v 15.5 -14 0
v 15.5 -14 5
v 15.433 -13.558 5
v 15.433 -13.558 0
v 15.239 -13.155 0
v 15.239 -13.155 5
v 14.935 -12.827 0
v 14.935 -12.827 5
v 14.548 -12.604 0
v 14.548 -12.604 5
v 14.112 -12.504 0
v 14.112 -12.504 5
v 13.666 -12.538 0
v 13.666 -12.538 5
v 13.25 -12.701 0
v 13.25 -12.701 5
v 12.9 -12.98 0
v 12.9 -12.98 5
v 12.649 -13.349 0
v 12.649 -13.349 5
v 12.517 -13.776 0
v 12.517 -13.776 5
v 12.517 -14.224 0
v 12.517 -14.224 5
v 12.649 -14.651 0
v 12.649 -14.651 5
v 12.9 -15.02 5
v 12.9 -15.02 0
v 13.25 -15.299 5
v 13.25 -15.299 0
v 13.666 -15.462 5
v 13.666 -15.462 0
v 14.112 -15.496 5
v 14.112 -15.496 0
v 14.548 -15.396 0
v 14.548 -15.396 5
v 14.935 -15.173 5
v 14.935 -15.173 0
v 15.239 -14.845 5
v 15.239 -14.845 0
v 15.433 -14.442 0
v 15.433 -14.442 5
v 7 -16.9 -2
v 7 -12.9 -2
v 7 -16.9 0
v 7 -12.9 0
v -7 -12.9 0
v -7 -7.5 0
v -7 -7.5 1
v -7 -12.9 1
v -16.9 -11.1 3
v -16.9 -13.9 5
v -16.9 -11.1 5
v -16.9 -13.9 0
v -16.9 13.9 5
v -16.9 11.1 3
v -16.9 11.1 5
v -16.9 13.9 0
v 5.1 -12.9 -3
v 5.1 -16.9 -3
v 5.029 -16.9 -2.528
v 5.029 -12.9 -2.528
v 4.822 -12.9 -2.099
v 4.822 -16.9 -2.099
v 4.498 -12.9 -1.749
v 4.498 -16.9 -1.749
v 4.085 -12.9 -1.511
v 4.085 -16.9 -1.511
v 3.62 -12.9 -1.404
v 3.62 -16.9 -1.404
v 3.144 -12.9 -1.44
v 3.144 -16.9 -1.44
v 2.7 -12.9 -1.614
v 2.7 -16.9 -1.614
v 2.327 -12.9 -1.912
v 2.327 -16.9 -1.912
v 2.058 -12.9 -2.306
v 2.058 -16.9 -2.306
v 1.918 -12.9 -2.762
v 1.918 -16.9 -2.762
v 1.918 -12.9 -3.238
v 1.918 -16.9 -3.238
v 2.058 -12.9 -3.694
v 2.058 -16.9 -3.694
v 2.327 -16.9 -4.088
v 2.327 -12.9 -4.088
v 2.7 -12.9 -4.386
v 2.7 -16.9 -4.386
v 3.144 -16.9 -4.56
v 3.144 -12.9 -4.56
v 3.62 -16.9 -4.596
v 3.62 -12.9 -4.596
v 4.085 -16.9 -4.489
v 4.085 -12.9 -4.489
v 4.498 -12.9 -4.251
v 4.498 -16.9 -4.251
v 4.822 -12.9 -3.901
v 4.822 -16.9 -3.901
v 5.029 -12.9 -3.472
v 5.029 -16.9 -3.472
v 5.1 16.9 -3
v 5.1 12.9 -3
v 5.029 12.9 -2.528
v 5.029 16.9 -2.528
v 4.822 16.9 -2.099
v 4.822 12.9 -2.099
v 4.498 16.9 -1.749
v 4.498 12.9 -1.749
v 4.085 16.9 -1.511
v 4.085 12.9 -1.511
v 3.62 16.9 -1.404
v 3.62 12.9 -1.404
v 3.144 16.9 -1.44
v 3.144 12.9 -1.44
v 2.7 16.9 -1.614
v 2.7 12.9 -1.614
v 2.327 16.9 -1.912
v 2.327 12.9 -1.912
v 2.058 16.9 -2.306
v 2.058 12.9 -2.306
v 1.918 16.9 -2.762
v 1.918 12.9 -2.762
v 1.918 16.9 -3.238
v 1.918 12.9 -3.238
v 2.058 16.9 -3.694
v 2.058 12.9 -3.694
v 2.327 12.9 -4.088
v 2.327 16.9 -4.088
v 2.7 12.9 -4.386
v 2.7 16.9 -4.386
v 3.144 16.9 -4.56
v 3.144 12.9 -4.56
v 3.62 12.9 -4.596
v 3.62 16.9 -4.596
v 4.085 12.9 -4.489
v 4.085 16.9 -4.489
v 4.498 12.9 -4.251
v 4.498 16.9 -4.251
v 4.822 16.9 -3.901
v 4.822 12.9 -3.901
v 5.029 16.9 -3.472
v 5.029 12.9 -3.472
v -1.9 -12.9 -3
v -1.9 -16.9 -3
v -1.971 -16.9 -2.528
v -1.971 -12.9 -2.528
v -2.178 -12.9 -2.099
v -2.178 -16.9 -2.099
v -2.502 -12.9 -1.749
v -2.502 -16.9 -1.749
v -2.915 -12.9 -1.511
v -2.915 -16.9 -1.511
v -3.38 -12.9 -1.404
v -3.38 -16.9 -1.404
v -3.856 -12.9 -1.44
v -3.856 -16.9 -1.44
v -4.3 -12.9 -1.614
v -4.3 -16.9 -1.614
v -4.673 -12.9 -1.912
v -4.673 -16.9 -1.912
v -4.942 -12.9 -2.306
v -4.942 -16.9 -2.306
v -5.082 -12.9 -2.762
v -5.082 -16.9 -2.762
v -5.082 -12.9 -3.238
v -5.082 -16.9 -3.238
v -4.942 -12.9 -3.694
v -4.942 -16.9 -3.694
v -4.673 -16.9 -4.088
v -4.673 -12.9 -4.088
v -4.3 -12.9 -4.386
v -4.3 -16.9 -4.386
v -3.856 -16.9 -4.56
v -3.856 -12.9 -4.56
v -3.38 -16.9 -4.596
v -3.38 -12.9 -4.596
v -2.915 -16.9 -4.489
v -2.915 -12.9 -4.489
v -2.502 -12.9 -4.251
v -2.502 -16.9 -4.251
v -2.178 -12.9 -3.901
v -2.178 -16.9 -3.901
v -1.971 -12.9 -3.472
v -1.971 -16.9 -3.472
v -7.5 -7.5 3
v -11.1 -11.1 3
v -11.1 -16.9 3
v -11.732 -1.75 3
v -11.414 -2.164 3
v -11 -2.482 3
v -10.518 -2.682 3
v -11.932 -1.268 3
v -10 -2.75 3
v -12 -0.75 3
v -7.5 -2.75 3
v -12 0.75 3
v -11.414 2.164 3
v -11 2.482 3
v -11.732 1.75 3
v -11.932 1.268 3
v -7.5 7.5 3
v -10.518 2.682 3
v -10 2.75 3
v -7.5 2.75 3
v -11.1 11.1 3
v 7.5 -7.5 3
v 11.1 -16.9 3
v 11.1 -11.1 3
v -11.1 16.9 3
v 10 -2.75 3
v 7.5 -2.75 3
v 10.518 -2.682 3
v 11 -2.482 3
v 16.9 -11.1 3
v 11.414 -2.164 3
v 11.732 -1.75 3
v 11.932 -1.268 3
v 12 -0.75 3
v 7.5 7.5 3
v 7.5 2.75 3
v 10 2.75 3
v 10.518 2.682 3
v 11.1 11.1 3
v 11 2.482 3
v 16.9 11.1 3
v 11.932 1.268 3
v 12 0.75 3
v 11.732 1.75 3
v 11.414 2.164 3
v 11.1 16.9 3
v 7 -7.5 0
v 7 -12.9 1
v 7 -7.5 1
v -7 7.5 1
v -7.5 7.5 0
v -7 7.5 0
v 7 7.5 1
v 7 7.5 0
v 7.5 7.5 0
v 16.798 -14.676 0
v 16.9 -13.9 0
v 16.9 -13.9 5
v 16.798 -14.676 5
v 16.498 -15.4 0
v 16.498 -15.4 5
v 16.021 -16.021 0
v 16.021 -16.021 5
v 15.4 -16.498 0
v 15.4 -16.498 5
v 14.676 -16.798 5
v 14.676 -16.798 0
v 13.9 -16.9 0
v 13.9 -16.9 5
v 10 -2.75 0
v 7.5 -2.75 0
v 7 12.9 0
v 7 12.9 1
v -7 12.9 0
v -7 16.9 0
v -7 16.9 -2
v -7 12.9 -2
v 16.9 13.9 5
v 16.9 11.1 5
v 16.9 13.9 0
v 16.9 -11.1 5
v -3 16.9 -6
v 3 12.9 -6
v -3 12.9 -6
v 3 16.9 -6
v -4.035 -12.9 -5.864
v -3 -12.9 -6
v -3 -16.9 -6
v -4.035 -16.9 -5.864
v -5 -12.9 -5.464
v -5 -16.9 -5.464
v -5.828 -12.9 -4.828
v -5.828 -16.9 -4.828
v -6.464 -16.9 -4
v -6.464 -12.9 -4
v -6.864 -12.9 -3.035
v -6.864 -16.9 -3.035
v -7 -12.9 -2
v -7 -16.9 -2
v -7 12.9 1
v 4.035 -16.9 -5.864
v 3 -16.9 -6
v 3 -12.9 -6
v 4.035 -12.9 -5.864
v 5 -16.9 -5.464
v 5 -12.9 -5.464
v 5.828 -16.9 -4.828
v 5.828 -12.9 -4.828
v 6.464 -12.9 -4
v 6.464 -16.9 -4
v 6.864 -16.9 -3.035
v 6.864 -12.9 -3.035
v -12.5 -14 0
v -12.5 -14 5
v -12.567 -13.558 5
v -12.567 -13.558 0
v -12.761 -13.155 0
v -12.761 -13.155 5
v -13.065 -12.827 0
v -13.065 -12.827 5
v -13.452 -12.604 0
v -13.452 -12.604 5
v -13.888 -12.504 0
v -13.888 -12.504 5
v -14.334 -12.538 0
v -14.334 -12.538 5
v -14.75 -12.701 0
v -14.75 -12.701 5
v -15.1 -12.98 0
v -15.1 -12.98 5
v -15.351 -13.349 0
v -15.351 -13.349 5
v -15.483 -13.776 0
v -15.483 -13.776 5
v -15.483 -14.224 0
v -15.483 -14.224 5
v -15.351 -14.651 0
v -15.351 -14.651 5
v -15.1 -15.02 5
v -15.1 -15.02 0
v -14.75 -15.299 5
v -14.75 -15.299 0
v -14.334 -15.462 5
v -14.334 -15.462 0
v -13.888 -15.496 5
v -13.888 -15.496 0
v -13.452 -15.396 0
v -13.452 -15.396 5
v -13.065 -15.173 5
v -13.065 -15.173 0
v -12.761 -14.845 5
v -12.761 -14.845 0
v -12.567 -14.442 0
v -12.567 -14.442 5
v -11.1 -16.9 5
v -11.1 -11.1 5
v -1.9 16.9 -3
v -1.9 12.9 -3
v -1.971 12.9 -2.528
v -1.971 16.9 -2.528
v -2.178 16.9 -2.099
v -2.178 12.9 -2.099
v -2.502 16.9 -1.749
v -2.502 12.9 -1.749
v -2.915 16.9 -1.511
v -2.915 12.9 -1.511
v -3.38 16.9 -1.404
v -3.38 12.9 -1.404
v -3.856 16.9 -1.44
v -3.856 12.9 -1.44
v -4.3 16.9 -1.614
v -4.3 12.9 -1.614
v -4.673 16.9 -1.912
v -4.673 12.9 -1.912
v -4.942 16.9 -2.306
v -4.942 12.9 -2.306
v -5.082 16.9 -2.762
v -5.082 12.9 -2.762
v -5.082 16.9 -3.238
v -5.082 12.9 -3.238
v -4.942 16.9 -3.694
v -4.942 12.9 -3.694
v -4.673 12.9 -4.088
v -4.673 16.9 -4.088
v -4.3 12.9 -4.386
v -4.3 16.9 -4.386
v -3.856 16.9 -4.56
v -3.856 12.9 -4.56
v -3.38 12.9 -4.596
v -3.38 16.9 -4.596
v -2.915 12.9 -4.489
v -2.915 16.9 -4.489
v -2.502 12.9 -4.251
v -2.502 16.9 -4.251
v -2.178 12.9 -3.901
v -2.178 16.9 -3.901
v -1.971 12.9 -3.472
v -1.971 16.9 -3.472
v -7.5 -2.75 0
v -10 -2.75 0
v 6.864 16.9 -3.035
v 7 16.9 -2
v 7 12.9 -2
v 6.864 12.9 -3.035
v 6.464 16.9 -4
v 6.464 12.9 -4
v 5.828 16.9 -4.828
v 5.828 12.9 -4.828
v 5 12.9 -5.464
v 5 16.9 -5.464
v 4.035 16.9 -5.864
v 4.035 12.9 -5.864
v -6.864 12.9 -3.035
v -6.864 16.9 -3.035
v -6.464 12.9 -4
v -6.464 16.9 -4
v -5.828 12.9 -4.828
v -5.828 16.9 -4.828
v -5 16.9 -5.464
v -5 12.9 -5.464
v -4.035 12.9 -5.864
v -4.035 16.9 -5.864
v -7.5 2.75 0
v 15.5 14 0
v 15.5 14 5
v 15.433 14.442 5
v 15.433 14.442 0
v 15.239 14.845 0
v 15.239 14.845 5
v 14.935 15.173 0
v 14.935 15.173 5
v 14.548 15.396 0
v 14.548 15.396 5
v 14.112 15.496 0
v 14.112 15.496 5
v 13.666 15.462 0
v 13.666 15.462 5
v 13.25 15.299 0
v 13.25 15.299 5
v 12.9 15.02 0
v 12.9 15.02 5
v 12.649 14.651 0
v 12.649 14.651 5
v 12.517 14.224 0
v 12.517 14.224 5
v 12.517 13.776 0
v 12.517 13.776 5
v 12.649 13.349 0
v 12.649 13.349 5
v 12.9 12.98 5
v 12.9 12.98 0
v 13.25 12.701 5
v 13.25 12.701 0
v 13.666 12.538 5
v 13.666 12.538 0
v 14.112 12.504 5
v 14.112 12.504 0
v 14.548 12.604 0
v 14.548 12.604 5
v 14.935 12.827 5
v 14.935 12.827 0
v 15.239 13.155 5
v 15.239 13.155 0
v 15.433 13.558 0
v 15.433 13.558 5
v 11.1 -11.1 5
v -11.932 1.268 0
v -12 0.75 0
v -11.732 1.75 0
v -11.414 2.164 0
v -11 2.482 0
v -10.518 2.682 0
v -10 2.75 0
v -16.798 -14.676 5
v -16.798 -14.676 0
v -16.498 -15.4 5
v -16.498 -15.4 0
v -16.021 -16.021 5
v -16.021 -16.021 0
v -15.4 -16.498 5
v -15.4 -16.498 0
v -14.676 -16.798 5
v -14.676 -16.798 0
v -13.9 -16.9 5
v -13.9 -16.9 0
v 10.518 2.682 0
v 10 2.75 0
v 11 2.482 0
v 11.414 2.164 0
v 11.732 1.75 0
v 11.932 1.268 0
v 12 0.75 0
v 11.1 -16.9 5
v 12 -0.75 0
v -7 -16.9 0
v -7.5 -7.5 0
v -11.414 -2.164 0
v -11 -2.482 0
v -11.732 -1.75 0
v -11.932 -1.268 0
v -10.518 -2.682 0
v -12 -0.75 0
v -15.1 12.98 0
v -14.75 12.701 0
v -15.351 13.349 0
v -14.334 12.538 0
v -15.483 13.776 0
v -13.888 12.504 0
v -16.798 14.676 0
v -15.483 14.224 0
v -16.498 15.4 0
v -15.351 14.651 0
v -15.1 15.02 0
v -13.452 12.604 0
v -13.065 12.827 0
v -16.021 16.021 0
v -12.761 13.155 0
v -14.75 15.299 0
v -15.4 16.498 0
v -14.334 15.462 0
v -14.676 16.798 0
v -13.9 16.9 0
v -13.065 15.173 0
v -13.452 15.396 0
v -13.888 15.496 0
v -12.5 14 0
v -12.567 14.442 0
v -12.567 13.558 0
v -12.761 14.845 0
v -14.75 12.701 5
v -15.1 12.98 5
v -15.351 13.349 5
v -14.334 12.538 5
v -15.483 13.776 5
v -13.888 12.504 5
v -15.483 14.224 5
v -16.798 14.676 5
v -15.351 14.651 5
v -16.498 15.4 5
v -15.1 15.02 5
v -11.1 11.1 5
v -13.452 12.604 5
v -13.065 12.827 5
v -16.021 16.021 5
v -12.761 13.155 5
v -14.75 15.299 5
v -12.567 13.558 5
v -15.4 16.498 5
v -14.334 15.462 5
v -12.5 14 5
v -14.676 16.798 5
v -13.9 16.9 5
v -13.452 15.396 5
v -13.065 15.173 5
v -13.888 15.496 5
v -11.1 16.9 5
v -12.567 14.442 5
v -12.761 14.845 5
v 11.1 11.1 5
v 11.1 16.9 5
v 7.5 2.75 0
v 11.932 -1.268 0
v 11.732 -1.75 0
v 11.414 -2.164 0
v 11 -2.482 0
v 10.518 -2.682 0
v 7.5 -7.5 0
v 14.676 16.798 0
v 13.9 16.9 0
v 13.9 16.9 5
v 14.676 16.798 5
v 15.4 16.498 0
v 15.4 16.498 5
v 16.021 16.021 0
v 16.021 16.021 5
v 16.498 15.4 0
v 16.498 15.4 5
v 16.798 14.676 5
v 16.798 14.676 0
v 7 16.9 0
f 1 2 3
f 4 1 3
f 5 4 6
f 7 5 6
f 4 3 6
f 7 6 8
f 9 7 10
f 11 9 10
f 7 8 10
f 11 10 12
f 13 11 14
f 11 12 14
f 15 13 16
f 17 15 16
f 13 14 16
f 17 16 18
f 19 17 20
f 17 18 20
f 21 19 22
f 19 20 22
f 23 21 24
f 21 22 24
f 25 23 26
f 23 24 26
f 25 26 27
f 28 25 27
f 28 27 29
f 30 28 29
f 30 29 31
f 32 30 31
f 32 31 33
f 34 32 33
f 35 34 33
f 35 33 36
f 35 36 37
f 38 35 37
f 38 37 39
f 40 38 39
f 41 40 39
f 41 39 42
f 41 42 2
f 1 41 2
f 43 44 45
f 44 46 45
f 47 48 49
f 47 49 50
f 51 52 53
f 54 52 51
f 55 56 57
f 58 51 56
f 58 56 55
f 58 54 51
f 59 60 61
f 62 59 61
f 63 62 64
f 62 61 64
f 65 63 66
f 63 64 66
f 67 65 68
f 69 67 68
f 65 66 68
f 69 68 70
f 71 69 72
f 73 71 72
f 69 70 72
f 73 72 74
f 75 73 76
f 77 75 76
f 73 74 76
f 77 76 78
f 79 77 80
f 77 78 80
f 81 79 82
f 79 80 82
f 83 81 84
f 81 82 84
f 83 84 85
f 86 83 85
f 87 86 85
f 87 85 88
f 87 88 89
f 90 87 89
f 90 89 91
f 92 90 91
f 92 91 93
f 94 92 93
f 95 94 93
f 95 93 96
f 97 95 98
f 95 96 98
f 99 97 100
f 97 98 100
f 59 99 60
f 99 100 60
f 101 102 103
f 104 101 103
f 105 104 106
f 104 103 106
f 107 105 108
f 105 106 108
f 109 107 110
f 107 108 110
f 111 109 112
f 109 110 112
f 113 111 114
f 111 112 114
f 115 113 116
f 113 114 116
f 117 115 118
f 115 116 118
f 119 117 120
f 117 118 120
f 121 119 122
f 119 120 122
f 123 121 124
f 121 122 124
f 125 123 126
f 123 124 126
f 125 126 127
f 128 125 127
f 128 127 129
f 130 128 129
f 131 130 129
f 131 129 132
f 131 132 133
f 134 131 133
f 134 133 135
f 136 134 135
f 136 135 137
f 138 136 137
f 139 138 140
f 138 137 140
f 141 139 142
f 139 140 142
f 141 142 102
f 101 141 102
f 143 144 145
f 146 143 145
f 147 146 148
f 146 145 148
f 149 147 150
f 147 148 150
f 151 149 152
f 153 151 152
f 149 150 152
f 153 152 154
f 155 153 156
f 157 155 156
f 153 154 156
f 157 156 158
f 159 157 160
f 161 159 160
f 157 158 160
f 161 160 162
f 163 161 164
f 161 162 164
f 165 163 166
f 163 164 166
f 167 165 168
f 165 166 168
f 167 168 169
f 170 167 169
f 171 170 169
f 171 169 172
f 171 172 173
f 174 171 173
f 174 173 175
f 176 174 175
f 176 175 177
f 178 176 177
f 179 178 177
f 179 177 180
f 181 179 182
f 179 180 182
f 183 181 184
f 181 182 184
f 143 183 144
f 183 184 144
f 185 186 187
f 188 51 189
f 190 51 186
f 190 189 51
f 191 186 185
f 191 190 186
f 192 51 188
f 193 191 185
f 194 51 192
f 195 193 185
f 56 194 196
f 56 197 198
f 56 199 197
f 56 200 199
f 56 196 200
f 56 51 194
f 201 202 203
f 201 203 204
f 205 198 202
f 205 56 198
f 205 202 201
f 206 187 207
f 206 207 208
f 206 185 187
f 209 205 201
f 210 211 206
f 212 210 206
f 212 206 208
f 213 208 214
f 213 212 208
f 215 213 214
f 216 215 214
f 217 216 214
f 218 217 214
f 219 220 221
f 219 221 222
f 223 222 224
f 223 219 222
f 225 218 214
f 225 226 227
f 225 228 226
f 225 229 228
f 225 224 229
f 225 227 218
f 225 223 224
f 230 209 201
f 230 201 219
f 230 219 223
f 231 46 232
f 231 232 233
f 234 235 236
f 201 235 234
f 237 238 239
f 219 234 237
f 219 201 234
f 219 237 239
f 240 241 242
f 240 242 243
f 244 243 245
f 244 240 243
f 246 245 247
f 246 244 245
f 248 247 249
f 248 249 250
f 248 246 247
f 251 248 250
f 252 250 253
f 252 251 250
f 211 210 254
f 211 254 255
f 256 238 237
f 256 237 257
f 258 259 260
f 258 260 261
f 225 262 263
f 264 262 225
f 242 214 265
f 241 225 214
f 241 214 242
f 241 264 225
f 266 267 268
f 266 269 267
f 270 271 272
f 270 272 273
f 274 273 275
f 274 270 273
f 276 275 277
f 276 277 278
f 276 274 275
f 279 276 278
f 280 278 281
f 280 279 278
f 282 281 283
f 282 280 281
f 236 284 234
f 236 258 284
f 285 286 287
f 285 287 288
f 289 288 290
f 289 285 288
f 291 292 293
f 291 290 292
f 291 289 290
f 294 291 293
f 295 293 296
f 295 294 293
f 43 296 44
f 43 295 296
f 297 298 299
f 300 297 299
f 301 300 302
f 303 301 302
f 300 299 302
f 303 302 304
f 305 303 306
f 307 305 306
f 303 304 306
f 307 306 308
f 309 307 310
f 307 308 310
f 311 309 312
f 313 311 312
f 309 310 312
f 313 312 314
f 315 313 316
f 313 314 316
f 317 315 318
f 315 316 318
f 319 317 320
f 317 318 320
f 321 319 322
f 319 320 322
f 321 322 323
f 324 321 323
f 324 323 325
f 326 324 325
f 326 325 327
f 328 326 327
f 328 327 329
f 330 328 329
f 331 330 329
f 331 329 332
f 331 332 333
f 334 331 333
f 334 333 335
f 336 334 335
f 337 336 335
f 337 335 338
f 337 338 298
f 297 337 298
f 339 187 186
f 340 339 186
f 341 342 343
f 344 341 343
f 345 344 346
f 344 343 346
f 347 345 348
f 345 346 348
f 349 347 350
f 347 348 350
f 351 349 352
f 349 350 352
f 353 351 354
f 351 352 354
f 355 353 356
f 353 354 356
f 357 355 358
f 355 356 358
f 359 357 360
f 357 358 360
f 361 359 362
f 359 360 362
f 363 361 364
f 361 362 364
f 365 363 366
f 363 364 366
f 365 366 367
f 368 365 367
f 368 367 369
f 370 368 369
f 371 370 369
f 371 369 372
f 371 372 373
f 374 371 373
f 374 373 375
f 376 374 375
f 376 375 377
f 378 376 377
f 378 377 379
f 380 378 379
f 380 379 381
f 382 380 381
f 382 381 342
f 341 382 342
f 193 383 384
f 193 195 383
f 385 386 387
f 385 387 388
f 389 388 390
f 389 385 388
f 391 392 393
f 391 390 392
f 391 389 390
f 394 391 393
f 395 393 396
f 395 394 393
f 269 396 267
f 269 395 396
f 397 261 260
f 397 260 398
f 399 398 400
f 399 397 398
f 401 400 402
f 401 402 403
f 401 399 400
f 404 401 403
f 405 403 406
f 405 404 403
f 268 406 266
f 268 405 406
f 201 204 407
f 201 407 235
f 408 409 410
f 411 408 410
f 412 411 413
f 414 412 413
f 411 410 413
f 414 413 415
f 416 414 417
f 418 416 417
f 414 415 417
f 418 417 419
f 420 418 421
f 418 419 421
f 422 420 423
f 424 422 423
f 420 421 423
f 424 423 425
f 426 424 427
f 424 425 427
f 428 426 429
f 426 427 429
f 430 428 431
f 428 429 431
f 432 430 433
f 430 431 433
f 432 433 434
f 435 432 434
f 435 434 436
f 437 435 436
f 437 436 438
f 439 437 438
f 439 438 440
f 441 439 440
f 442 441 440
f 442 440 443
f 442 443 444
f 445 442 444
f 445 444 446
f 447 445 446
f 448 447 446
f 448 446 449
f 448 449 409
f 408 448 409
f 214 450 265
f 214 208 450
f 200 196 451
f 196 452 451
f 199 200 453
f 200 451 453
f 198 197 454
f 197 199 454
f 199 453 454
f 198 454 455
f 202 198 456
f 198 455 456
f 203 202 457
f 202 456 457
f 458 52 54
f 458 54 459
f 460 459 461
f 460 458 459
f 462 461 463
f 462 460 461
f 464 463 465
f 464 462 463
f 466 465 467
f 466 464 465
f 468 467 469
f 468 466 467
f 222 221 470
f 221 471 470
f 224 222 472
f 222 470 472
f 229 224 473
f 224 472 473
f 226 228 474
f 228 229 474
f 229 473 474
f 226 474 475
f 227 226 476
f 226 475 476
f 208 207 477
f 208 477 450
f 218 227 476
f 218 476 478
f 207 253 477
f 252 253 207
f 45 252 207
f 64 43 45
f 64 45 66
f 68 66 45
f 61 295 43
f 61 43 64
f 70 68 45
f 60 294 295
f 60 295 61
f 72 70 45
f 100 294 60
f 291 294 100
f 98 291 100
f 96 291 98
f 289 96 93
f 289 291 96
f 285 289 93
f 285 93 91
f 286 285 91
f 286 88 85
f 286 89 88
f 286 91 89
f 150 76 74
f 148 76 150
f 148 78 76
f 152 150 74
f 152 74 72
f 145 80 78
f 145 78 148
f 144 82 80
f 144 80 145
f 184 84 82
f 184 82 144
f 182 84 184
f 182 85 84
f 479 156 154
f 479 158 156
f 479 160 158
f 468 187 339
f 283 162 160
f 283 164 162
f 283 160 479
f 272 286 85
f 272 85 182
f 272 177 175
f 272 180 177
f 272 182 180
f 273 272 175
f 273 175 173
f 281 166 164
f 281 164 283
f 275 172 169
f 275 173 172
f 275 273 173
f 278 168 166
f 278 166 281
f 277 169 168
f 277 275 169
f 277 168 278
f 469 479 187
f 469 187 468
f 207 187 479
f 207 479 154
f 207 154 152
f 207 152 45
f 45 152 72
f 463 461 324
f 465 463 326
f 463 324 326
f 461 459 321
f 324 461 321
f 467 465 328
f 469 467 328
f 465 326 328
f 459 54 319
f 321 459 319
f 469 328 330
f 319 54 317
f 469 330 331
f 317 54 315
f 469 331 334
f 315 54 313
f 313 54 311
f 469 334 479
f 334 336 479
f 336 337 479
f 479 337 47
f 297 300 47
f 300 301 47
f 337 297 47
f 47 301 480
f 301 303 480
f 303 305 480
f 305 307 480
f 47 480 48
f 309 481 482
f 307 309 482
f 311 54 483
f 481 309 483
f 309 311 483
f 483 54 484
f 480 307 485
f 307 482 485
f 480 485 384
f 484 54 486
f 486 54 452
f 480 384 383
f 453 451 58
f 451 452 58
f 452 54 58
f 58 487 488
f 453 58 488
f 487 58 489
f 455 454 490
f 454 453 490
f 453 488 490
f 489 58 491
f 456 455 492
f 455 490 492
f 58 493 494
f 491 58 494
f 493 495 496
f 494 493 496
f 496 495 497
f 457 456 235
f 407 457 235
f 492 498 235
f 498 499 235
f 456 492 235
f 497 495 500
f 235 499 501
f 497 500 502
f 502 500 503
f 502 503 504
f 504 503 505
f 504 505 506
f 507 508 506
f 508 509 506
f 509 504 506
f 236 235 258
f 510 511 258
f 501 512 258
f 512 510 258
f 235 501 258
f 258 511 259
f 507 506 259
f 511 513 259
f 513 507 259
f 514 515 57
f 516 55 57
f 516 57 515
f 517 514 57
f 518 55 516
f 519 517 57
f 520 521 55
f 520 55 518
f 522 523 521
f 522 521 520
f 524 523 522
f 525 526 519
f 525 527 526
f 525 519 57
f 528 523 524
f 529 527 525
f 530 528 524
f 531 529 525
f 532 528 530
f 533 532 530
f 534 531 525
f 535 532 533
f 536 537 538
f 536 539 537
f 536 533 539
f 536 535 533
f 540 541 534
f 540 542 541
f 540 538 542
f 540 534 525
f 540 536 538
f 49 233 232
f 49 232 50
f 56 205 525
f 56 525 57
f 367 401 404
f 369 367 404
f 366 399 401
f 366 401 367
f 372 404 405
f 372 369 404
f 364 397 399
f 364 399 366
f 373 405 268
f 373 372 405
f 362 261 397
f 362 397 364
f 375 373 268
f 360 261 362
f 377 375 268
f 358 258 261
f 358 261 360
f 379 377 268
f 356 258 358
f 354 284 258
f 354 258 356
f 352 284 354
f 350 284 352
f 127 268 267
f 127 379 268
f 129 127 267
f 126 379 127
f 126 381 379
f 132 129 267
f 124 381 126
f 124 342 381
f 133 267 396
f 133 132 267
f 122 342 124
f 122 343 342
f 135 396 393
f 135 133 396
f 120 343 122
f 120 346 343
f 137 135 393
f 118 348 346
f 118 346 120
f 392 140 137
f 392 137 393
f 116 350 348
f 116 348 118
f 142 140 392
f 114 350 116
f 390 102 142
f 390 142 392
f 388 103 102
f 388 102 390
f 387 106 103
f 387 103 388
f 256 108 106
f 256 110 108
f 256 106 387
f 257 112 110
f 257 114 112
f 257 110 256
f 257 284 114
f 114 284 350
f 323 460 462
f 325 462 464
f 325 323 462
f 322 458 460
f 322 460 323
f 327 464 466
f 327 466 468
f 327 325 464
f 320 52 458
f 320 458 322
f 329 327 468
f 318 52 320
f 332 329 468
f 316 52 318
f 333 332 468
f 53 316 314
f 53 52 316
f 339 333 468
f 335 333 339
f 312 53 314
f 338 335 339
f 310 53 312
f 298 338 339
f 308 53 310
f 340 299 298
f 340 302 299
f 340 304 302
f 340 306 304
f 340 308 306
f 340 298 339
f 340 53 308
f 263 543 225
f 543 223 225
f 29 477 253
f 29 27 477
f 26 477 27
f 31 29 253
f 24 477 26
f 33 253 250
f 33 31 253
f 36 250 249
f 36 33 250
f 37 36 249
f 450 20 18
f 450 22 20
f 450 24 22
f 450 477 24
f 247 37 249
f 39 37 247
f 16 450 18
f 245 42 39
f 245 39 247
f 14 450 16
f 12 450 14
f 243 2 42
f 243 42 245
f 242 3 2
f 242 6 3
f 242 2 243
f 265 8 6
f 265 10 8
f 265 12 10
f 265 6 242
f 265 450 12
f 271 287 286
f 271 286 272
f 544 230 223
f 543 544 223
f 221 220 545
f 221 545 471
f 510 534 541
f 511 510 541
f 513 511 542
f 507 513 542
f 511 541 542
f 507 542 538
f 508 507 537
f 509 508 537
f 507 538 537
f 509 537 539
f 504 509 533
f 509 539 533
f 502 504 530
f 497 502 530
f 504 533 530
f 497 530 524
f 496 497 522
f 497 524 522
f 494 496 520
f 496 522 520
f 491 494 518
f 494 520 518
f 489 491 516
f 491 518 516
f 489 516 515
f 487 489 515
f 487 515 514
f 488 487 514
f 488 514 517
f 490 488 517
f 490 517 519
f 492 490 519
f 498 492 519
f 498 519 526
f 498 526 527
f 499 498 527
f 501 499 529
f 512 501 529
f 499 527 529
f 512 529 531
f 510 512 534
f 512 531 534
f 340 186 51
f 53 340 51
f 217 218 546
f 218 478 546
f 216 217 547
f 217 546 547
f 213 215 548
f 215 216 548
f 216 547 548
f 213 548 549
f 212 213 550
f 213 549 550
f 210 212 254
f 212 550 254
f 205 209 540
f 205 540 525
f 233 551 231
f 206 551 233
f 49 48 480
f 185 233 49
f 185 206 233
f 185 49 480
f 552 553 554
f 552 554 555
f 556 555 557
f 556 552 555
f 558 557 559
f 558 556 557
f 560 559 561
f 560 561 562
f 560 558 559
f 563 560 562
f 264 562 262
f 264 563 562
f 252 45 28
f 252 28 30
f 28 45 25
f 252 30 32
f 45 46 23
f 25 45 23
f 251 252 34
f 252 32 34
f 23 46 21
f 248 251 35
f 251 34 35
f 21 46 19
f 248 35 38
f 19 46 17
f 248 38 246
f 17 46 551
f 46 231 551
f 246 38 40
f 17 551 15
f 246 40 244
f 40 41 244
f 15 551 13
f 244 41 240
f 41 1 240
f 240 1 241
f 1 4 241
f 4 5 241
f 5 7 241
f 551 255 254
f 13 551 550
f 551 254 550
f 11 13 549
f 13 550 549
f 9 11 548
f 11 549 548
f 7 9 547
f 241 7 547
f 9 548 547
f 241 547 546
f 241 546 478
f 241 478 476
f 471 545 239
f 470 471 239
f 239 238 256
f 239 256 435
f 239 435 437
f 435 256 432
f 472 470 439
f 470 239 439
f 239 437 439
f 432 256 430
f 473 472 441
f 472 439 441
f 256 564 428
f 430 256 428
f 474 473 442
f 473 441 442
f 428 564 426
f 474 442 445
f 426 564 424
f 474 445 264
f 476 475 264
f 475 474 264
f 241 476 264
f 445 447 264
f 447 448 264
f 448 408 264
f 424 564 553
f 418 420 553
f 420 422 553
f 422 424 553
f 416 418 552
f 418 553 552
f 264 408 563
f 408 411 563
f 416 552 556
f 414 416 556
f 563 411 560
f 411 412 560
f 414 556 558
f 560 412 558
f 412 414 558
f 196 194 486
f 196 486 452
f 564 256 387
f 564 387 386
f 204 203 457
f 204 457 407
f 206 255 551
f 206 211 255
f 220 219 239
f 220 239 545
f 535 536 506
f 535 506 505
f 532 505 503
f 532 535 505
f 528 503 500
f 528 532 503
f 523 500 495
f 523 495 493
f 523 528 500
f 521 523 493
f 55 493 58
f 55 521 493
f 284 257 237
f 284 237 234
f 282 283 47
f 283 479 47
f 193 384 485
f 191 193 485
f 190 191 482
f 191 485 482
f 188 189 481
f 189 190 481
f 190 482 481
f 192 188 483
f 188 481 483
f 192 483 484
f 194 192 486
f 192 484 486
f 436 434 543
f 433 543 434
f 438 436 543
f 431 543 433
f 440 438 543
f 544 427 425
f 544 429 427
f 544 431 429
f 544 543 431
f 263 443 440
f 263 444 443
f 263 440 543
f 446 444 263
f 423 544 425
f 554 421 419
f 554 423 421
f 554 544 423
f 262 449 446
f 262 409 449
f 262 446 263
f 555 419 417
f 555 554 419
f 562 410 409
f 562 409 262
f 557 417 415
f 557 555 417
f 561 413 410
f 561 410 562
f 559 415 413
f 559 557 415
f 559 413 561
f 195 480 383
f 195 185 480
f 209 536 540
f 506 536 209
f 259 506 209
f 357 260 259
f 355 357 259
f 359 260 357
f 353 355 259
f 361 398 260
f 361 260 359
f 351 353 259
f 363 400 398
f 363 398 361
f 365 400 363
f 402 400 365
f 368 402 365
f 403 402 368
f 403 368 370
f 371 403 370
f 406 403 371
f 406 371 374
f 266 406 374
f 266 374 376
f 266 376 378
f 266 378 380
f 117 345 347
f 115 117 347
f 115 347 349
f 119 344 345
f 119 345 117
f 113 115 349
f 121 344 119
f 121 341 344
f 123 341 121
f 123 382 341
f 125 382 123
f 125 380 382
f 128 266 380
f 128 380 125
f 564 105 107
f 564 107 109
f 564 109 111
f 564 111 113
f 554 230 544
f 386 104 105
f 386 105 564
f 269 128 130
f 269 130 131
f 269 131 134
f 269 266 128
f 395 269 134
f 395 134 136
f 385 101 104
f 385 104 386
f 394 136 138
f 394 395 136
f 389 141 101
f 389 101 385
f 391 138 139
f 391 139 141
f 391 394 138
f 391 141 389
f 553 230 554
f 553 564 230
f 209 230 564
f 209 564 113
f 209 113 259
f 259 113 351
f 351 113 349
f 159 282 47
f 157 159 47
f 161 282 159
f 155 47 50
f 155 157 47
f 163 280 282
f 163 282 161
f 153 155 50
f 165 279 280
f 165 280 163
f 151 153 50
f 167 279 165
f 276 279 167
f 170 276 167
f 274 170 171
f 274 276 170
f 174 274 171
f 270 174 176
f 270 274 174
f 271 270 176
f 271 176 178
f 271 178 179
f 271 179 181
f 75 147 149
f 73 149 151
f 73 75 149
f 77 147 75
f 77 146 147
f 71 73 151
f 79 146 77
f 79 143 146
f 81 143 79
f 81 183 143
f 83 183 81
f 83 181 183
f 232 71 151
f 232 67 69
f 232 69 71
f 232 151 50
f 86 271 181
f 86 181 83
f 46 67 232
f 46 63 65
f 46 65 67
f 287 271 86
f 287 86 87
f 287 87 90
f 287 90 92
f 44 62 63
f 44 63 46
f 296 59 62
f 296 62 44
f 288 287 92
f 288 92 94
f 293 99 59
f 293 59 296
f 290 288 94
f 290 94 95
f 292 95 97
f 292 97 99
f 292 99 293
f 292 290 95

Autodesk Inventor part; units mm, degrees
ref_plane "YZ Plane" through (0, 0, 0) normal (1, 0, 0) x (0, 1, 0)
ref_plane "XZ Plane" through (0, 0, 0) normal (0, 1, 0) x (-1, 0, 0)
ref_plane "XY Plane" through (0, 0, 0) normal (0, 0, 1) x (1, 0, 0)
sketch "스케치1" plane through (0, 0, 0) normal (0, 0, 1) x (1, 0, 0)
  line L0 (-16.9, 16.9) -> (16.9, 16.9)
  line L1 (16.9, 16.9) -> (16.9, -16.9)
  line L2 (16.9, -16.9) -> (-16.9, -16.9)
  line L3 (-16.9, -16.9) -> (-16.9, 16.9)
  point P0 (0, 0)
  dimension "d0" = 33.8
  dimension "d1" = 33.8
  dimension "d2" = 16.9
  dimension "d3" = 16.9
extrude "돌출1" add sketch "스케치1" along normal blind 3
sketch "스케치2" plane through (0, 0, 3) normal (0, 0, 1) x (1, 0, 0)
  circle A0 centre (-14, 14) radius 1.25
  circle A1 centre (14, 14) radius 1.25
  circle A2 centre (-14, -14) radius 1.25
  circle A3 centre (14, -14) radius 1.25
  line L0 (-16.9, 16.9) -> (-16.9, -16.9) projected
  line L1 (16.9, 16.9) -> (-16.9, 16.9) projected
  line L2 (16.9, -16.9) -> (16.9, 16.9) projected
  line L3 (-16.9, -16.9) -> (16.9, -16.9) projected
  line L4 (-16.9, 16.9) -> (-11.1, 16.9)
  line L5 (-11.1, 16.9) -> (-11.1, 11.1)
  line L6 (-11.1, 11.1) -> (-16.9, 11.1)
  line L7 (-16.9, 11.1) -> (-16.9, 16.9)
  line L8 (16.9, 16.9) -> (11.1, 16.9)
  line L9 (11.1, 16.9) -> (11.1, 11.1)
  line L10 (11.1, 11.1) -> (16.9, 11.1)
  line L11 (16.9, 11.1) -> (16.9, 16.9)
  line L12 (-16.9, -16.9) -> (-11.1, -16.9)
  line L13 (-11.1, -16.9) -> (-11.1, -11.1)
  line L14 (-11.1, -11.1) -> (-16.9, -11.1)
  line L15 (-16.9, -11.1) -> (-16.9, -16.9)
  line L16 (16.9, -16.9) -> (11.1, -16.9)
  line L17 (11.1, -16.9) -> (11.1, -11.1)
  line L18 (11.1, -11.1) -> (16.9, -11.1)
  line L19 (16.9, -11.1) -> (16.9, -16.9)
  point P0 (0, 0)
  dimension "d6" = 2.5
  dimension "d7" = 2.5
  dimension "d8" = 2.5
  dimension "d9" = 2.5
  dimension "d10" = 2.9
  dimension "d11" = 2.9
  dimension "d12" = 2.9
  dimension "d13" = 2.9
  dimension "d14" = 2.9
  dimension "d15" = 2.9
  dimension "d16" = 2.9
  dimension "d17" = 2.9
  dimension "d18" = 5.8
  dimension "d19" = 5.8
  dimension "d20" = 11.1
  dimension "d21" = 5.8
  dimension "d22" = 5.8
  dimension "d23" = 5.8
  dimension "d24" = 5.8
  dimension "d25" = 5.8
  dimension "d26" = 5.8
extrude "돌출2" add sketch "스케치2" along normal blind 2 contours A0 | A1 | A2 | A3 | L1 L5 L6 L0 | L14 L13 L3 L0 | L1 L2 L10 L9 | L17 L18 L2 L3
sketch "스케치3" plane through (0, 0, 5) normal (0, 0, 1) x (1, 0, 0)
  circle A0 centre (-14, 14) radius 1.5
  circle A1 centre (14, 14) radius 1.5
  circle A2 centre (14, -14) radius 1.5
  circle A3 centre (-14, -14) radius 1.5
  line L0 (-16.9, -11.1) -> (-16.9, -16.9) projected
  line L1 (-16.9, -16.9) -> (-11.1, -16.9) projected
  line L2 (11.1, -16.9) -> (16.9, -16.9) projected
  line L3 (16.9, -16.9) -> (16.9, -11.1) projected
  line L4 (11.1, 11.1) -> (16.9, 11.1) projected
  line L5 (16.9, 11.1) -> (16.9, 16.9) projected
  line L6 (-16.9, 16.9) -> (-16.9, 11.1) projected
  line L7 (-11.1, 16.9) -> (-16.9, 16.9) projected
  point P0 (0, 0)
  dimension "d29" = 3
  dimension "d30" = 3
  dimension "d31" = 3
  dimension "d32" = 3
  dimension "d33" = 2.9
  dimension "d34" = 2.9
  dimension "d35" = 2.9
  dimension "d36" = 2.9
  dimension "d37" = 2.9
  dimension "d38" = 2.9
  dimension "d39" = 2.9
  dimension "d40" = 2.9
extrude "돌출3" cut sketch "스케치3" against normal up to surface (5 mm away)
sketch "스케치4" plane through (0, 0, 3) normal (0, 0, 1) x (1, 0, 0)
  line L0 (-7.5, 7.5) -> (7.5, 7.5)
  line L1 (7.5, 7.5) -> (7.5, -7.5)
  line L2 (7.5, -7.5) -> (-7.5, -7.5)
  line L3 (-7.5, -7.5) -> (-7.5, 7.5)
  point P0 (0, 0)
  dimension "d43" = 15
  dimension "d44" = 15
  dimension "d45" = 7.5
  dimension "d46" = 7.5
extrude "돌출4" cut sketch "스케치4" against normal up to surface (3 mm away)
sketch "스케치5" plane through (0, 0, 3) normal (0, 0, 1) x (1, 0, 0)
  line L0 (-7.5, -2.75) -> (-12, -2.75)
  line L1 (-12, -2.75) -> (-12, 2.75)
  line L2 (-12, 2.75) -> (-7.5, 2.75)
  line L3 (-7.5, 2.75) -> (-7.5, -2.75)
  line L4 (7.5, 2.75) -> (12, 2.75)
  line L5 (12, 2.75) -> (12, -2.75)
  line L6 (12, -2.75) -> (7.5, -2.75)
  line L7 (7.5, -2.75) -> (7.5, 2.75)
  line L8 (-7.5, -7.5) -> (-7.5, 7.5) projected
  line L9 (7.5, 7.5) -> (7.5, -7.5) projected
  point P0 (0, 0)
  dimension "d49" = 4.5
  dimension "d50" = 5.5
  dimension "d51" = 4.5
  dimension "d52" = 5.5
  dimension "d53" = 0
  dimension "d54" = 2.75
  dimension "d55" = 0
  dimension "d56" = 2.75
extrude "돌출5" cut sketch "스케치5" against normal up to surface (3 mm away)
fillet "모깎기1" radius 2 4 edges at (-12, 2.75, 1.5) (-12, -2.75, 1.5) (12, -2.75, 1.5) (12, 2.75, 1.5)
sketch "스케치6" plane through (0, 0, 0) normal (0, 0, -1) x (-1, 0, 0)
  line L0 (16.9, 16.9) -> (-16.9, 16.9) projected
  line L1 (-7, 16.9) -> (7, 16.9)
  line L2 (7, 16.9) -> (7, 12.9)
  line L3 (7, 12.9) -> (-7, 12.9)
  line L4 (-7, 12.9) -> (-7, 16.9)
  line L5 (-7, -16.9) -> (7, -16.9)
  line L6 (7, -16.9) -> (7, -12.9)
  line L7 (7, -12.9) -> (-7, -12.9)
  line L8 (-7, -12.9) -> (-7, -16.9)
  line L9 (-16.9, -16.9) -> (16.9, -16.9) projected
  point P0 (0, 0)
  dimension "d60" = 4
  dimension "d61" = 4
  dimension "d62" = 4
  dimension "d63" = 14
  dimension "d64" = 7
  dimension "d65" = 7
  dimension "d66" = 14
extrude "돌출6" add sketch "스케치6" along normal blind 6
sketch "스케치7" plane through (-11.1, -16.9, 3) normal (0, -1, 0) x (1, 0, 0)
  circle A0 centre (14.6, -6) radius 1.6
  circle A1 centre (7.6, -6) radius 1.6
  line L0 (18.1, -3) -> (18.1, -9) projected
  line L1 (4.1, -3) -> (4.1, -9) projected
  line L2 (18.1, -9) -> (4.1, -9) projected
  point P0 (11.1, -3)
  dimension "d69" = 3.2
  dimension "d70" = 3.5
  dimension "d71" = 3.5
  dimension "d72" = 3
  dimension "d73" = 3
  dimension "d74" = 3.2
extrude "돌출7" cut sketch "스케치7" against normal up to surface (33.8 mm away)
fillet "모깎기2" radius 4 4 edges at (-7, 14.9, -6) (7, 14.9, -6) (-7, -14.9, -6) (7, -14.9, -6)
fillet "모깎기2" radius 3 4 edges at (-16.9, 16.9, 2.5) (-16.9, -16.9, 2.5) (16.9, 16.9, 2.5) (16.9, -16.9, 2.5)
sketch "스케치10" plane through (0, 0, 0) normal (0, 0, -1) x (-1, 0, 0)
  line L0 (7, -16.9) -> (7, -12.9) projected
  line L1 (-7.5, -7.5) -> (7.5, -7.5) projected
  line L2 (7, -12.9) -> (-7, -12.9)
  line L3 (-7, -12.9) -> (-7, -7.5)
  line L4 (-7, -7.5) -> (7, -7.5)
  line L5 (7, -7.5) -> (7, -12.9)
  line L6 (-7, -12.9) -> (-7, -16.9) projected
  line L7 (-7.5, 7.5) -> (7.5, 7.5) projected
  line L8 (-7, 12.9) -> (7, 12.9)
  line L9 (7, 12.9) -> (7, 7.5)
  line L10 (7, 7.5) -> (-7, 7.5)
  line L11 (-7, 7.5) -> (-7, 12.9)
  point P0 (0, 0)
  dimension "d94" = 14
  dimension "d96" = 14
  dimension "d99" = 14
extrude "돌출10" cut sketch "스케치10" against normal blind 1
equation "\"d2\" = 0.5 * d0"
equation "\"d3\" = 0.5 * d1"
equation "\"d45\" = 0.5 * d44"
equation "\"d46\" = 0.5 * d43"
equation "\"d54\" = 0.5 * d50"
equation "\"d56\" = 0.5 * d52"
equation "\"d64\" = 0.5 * d63"
equation "\"d65\" = 0.5 * d66"
equation "\"d72\" = d73"
equation "\"d96\" = d94"
properties part number "Camera_Cover" material "LCP 플라스틱"
